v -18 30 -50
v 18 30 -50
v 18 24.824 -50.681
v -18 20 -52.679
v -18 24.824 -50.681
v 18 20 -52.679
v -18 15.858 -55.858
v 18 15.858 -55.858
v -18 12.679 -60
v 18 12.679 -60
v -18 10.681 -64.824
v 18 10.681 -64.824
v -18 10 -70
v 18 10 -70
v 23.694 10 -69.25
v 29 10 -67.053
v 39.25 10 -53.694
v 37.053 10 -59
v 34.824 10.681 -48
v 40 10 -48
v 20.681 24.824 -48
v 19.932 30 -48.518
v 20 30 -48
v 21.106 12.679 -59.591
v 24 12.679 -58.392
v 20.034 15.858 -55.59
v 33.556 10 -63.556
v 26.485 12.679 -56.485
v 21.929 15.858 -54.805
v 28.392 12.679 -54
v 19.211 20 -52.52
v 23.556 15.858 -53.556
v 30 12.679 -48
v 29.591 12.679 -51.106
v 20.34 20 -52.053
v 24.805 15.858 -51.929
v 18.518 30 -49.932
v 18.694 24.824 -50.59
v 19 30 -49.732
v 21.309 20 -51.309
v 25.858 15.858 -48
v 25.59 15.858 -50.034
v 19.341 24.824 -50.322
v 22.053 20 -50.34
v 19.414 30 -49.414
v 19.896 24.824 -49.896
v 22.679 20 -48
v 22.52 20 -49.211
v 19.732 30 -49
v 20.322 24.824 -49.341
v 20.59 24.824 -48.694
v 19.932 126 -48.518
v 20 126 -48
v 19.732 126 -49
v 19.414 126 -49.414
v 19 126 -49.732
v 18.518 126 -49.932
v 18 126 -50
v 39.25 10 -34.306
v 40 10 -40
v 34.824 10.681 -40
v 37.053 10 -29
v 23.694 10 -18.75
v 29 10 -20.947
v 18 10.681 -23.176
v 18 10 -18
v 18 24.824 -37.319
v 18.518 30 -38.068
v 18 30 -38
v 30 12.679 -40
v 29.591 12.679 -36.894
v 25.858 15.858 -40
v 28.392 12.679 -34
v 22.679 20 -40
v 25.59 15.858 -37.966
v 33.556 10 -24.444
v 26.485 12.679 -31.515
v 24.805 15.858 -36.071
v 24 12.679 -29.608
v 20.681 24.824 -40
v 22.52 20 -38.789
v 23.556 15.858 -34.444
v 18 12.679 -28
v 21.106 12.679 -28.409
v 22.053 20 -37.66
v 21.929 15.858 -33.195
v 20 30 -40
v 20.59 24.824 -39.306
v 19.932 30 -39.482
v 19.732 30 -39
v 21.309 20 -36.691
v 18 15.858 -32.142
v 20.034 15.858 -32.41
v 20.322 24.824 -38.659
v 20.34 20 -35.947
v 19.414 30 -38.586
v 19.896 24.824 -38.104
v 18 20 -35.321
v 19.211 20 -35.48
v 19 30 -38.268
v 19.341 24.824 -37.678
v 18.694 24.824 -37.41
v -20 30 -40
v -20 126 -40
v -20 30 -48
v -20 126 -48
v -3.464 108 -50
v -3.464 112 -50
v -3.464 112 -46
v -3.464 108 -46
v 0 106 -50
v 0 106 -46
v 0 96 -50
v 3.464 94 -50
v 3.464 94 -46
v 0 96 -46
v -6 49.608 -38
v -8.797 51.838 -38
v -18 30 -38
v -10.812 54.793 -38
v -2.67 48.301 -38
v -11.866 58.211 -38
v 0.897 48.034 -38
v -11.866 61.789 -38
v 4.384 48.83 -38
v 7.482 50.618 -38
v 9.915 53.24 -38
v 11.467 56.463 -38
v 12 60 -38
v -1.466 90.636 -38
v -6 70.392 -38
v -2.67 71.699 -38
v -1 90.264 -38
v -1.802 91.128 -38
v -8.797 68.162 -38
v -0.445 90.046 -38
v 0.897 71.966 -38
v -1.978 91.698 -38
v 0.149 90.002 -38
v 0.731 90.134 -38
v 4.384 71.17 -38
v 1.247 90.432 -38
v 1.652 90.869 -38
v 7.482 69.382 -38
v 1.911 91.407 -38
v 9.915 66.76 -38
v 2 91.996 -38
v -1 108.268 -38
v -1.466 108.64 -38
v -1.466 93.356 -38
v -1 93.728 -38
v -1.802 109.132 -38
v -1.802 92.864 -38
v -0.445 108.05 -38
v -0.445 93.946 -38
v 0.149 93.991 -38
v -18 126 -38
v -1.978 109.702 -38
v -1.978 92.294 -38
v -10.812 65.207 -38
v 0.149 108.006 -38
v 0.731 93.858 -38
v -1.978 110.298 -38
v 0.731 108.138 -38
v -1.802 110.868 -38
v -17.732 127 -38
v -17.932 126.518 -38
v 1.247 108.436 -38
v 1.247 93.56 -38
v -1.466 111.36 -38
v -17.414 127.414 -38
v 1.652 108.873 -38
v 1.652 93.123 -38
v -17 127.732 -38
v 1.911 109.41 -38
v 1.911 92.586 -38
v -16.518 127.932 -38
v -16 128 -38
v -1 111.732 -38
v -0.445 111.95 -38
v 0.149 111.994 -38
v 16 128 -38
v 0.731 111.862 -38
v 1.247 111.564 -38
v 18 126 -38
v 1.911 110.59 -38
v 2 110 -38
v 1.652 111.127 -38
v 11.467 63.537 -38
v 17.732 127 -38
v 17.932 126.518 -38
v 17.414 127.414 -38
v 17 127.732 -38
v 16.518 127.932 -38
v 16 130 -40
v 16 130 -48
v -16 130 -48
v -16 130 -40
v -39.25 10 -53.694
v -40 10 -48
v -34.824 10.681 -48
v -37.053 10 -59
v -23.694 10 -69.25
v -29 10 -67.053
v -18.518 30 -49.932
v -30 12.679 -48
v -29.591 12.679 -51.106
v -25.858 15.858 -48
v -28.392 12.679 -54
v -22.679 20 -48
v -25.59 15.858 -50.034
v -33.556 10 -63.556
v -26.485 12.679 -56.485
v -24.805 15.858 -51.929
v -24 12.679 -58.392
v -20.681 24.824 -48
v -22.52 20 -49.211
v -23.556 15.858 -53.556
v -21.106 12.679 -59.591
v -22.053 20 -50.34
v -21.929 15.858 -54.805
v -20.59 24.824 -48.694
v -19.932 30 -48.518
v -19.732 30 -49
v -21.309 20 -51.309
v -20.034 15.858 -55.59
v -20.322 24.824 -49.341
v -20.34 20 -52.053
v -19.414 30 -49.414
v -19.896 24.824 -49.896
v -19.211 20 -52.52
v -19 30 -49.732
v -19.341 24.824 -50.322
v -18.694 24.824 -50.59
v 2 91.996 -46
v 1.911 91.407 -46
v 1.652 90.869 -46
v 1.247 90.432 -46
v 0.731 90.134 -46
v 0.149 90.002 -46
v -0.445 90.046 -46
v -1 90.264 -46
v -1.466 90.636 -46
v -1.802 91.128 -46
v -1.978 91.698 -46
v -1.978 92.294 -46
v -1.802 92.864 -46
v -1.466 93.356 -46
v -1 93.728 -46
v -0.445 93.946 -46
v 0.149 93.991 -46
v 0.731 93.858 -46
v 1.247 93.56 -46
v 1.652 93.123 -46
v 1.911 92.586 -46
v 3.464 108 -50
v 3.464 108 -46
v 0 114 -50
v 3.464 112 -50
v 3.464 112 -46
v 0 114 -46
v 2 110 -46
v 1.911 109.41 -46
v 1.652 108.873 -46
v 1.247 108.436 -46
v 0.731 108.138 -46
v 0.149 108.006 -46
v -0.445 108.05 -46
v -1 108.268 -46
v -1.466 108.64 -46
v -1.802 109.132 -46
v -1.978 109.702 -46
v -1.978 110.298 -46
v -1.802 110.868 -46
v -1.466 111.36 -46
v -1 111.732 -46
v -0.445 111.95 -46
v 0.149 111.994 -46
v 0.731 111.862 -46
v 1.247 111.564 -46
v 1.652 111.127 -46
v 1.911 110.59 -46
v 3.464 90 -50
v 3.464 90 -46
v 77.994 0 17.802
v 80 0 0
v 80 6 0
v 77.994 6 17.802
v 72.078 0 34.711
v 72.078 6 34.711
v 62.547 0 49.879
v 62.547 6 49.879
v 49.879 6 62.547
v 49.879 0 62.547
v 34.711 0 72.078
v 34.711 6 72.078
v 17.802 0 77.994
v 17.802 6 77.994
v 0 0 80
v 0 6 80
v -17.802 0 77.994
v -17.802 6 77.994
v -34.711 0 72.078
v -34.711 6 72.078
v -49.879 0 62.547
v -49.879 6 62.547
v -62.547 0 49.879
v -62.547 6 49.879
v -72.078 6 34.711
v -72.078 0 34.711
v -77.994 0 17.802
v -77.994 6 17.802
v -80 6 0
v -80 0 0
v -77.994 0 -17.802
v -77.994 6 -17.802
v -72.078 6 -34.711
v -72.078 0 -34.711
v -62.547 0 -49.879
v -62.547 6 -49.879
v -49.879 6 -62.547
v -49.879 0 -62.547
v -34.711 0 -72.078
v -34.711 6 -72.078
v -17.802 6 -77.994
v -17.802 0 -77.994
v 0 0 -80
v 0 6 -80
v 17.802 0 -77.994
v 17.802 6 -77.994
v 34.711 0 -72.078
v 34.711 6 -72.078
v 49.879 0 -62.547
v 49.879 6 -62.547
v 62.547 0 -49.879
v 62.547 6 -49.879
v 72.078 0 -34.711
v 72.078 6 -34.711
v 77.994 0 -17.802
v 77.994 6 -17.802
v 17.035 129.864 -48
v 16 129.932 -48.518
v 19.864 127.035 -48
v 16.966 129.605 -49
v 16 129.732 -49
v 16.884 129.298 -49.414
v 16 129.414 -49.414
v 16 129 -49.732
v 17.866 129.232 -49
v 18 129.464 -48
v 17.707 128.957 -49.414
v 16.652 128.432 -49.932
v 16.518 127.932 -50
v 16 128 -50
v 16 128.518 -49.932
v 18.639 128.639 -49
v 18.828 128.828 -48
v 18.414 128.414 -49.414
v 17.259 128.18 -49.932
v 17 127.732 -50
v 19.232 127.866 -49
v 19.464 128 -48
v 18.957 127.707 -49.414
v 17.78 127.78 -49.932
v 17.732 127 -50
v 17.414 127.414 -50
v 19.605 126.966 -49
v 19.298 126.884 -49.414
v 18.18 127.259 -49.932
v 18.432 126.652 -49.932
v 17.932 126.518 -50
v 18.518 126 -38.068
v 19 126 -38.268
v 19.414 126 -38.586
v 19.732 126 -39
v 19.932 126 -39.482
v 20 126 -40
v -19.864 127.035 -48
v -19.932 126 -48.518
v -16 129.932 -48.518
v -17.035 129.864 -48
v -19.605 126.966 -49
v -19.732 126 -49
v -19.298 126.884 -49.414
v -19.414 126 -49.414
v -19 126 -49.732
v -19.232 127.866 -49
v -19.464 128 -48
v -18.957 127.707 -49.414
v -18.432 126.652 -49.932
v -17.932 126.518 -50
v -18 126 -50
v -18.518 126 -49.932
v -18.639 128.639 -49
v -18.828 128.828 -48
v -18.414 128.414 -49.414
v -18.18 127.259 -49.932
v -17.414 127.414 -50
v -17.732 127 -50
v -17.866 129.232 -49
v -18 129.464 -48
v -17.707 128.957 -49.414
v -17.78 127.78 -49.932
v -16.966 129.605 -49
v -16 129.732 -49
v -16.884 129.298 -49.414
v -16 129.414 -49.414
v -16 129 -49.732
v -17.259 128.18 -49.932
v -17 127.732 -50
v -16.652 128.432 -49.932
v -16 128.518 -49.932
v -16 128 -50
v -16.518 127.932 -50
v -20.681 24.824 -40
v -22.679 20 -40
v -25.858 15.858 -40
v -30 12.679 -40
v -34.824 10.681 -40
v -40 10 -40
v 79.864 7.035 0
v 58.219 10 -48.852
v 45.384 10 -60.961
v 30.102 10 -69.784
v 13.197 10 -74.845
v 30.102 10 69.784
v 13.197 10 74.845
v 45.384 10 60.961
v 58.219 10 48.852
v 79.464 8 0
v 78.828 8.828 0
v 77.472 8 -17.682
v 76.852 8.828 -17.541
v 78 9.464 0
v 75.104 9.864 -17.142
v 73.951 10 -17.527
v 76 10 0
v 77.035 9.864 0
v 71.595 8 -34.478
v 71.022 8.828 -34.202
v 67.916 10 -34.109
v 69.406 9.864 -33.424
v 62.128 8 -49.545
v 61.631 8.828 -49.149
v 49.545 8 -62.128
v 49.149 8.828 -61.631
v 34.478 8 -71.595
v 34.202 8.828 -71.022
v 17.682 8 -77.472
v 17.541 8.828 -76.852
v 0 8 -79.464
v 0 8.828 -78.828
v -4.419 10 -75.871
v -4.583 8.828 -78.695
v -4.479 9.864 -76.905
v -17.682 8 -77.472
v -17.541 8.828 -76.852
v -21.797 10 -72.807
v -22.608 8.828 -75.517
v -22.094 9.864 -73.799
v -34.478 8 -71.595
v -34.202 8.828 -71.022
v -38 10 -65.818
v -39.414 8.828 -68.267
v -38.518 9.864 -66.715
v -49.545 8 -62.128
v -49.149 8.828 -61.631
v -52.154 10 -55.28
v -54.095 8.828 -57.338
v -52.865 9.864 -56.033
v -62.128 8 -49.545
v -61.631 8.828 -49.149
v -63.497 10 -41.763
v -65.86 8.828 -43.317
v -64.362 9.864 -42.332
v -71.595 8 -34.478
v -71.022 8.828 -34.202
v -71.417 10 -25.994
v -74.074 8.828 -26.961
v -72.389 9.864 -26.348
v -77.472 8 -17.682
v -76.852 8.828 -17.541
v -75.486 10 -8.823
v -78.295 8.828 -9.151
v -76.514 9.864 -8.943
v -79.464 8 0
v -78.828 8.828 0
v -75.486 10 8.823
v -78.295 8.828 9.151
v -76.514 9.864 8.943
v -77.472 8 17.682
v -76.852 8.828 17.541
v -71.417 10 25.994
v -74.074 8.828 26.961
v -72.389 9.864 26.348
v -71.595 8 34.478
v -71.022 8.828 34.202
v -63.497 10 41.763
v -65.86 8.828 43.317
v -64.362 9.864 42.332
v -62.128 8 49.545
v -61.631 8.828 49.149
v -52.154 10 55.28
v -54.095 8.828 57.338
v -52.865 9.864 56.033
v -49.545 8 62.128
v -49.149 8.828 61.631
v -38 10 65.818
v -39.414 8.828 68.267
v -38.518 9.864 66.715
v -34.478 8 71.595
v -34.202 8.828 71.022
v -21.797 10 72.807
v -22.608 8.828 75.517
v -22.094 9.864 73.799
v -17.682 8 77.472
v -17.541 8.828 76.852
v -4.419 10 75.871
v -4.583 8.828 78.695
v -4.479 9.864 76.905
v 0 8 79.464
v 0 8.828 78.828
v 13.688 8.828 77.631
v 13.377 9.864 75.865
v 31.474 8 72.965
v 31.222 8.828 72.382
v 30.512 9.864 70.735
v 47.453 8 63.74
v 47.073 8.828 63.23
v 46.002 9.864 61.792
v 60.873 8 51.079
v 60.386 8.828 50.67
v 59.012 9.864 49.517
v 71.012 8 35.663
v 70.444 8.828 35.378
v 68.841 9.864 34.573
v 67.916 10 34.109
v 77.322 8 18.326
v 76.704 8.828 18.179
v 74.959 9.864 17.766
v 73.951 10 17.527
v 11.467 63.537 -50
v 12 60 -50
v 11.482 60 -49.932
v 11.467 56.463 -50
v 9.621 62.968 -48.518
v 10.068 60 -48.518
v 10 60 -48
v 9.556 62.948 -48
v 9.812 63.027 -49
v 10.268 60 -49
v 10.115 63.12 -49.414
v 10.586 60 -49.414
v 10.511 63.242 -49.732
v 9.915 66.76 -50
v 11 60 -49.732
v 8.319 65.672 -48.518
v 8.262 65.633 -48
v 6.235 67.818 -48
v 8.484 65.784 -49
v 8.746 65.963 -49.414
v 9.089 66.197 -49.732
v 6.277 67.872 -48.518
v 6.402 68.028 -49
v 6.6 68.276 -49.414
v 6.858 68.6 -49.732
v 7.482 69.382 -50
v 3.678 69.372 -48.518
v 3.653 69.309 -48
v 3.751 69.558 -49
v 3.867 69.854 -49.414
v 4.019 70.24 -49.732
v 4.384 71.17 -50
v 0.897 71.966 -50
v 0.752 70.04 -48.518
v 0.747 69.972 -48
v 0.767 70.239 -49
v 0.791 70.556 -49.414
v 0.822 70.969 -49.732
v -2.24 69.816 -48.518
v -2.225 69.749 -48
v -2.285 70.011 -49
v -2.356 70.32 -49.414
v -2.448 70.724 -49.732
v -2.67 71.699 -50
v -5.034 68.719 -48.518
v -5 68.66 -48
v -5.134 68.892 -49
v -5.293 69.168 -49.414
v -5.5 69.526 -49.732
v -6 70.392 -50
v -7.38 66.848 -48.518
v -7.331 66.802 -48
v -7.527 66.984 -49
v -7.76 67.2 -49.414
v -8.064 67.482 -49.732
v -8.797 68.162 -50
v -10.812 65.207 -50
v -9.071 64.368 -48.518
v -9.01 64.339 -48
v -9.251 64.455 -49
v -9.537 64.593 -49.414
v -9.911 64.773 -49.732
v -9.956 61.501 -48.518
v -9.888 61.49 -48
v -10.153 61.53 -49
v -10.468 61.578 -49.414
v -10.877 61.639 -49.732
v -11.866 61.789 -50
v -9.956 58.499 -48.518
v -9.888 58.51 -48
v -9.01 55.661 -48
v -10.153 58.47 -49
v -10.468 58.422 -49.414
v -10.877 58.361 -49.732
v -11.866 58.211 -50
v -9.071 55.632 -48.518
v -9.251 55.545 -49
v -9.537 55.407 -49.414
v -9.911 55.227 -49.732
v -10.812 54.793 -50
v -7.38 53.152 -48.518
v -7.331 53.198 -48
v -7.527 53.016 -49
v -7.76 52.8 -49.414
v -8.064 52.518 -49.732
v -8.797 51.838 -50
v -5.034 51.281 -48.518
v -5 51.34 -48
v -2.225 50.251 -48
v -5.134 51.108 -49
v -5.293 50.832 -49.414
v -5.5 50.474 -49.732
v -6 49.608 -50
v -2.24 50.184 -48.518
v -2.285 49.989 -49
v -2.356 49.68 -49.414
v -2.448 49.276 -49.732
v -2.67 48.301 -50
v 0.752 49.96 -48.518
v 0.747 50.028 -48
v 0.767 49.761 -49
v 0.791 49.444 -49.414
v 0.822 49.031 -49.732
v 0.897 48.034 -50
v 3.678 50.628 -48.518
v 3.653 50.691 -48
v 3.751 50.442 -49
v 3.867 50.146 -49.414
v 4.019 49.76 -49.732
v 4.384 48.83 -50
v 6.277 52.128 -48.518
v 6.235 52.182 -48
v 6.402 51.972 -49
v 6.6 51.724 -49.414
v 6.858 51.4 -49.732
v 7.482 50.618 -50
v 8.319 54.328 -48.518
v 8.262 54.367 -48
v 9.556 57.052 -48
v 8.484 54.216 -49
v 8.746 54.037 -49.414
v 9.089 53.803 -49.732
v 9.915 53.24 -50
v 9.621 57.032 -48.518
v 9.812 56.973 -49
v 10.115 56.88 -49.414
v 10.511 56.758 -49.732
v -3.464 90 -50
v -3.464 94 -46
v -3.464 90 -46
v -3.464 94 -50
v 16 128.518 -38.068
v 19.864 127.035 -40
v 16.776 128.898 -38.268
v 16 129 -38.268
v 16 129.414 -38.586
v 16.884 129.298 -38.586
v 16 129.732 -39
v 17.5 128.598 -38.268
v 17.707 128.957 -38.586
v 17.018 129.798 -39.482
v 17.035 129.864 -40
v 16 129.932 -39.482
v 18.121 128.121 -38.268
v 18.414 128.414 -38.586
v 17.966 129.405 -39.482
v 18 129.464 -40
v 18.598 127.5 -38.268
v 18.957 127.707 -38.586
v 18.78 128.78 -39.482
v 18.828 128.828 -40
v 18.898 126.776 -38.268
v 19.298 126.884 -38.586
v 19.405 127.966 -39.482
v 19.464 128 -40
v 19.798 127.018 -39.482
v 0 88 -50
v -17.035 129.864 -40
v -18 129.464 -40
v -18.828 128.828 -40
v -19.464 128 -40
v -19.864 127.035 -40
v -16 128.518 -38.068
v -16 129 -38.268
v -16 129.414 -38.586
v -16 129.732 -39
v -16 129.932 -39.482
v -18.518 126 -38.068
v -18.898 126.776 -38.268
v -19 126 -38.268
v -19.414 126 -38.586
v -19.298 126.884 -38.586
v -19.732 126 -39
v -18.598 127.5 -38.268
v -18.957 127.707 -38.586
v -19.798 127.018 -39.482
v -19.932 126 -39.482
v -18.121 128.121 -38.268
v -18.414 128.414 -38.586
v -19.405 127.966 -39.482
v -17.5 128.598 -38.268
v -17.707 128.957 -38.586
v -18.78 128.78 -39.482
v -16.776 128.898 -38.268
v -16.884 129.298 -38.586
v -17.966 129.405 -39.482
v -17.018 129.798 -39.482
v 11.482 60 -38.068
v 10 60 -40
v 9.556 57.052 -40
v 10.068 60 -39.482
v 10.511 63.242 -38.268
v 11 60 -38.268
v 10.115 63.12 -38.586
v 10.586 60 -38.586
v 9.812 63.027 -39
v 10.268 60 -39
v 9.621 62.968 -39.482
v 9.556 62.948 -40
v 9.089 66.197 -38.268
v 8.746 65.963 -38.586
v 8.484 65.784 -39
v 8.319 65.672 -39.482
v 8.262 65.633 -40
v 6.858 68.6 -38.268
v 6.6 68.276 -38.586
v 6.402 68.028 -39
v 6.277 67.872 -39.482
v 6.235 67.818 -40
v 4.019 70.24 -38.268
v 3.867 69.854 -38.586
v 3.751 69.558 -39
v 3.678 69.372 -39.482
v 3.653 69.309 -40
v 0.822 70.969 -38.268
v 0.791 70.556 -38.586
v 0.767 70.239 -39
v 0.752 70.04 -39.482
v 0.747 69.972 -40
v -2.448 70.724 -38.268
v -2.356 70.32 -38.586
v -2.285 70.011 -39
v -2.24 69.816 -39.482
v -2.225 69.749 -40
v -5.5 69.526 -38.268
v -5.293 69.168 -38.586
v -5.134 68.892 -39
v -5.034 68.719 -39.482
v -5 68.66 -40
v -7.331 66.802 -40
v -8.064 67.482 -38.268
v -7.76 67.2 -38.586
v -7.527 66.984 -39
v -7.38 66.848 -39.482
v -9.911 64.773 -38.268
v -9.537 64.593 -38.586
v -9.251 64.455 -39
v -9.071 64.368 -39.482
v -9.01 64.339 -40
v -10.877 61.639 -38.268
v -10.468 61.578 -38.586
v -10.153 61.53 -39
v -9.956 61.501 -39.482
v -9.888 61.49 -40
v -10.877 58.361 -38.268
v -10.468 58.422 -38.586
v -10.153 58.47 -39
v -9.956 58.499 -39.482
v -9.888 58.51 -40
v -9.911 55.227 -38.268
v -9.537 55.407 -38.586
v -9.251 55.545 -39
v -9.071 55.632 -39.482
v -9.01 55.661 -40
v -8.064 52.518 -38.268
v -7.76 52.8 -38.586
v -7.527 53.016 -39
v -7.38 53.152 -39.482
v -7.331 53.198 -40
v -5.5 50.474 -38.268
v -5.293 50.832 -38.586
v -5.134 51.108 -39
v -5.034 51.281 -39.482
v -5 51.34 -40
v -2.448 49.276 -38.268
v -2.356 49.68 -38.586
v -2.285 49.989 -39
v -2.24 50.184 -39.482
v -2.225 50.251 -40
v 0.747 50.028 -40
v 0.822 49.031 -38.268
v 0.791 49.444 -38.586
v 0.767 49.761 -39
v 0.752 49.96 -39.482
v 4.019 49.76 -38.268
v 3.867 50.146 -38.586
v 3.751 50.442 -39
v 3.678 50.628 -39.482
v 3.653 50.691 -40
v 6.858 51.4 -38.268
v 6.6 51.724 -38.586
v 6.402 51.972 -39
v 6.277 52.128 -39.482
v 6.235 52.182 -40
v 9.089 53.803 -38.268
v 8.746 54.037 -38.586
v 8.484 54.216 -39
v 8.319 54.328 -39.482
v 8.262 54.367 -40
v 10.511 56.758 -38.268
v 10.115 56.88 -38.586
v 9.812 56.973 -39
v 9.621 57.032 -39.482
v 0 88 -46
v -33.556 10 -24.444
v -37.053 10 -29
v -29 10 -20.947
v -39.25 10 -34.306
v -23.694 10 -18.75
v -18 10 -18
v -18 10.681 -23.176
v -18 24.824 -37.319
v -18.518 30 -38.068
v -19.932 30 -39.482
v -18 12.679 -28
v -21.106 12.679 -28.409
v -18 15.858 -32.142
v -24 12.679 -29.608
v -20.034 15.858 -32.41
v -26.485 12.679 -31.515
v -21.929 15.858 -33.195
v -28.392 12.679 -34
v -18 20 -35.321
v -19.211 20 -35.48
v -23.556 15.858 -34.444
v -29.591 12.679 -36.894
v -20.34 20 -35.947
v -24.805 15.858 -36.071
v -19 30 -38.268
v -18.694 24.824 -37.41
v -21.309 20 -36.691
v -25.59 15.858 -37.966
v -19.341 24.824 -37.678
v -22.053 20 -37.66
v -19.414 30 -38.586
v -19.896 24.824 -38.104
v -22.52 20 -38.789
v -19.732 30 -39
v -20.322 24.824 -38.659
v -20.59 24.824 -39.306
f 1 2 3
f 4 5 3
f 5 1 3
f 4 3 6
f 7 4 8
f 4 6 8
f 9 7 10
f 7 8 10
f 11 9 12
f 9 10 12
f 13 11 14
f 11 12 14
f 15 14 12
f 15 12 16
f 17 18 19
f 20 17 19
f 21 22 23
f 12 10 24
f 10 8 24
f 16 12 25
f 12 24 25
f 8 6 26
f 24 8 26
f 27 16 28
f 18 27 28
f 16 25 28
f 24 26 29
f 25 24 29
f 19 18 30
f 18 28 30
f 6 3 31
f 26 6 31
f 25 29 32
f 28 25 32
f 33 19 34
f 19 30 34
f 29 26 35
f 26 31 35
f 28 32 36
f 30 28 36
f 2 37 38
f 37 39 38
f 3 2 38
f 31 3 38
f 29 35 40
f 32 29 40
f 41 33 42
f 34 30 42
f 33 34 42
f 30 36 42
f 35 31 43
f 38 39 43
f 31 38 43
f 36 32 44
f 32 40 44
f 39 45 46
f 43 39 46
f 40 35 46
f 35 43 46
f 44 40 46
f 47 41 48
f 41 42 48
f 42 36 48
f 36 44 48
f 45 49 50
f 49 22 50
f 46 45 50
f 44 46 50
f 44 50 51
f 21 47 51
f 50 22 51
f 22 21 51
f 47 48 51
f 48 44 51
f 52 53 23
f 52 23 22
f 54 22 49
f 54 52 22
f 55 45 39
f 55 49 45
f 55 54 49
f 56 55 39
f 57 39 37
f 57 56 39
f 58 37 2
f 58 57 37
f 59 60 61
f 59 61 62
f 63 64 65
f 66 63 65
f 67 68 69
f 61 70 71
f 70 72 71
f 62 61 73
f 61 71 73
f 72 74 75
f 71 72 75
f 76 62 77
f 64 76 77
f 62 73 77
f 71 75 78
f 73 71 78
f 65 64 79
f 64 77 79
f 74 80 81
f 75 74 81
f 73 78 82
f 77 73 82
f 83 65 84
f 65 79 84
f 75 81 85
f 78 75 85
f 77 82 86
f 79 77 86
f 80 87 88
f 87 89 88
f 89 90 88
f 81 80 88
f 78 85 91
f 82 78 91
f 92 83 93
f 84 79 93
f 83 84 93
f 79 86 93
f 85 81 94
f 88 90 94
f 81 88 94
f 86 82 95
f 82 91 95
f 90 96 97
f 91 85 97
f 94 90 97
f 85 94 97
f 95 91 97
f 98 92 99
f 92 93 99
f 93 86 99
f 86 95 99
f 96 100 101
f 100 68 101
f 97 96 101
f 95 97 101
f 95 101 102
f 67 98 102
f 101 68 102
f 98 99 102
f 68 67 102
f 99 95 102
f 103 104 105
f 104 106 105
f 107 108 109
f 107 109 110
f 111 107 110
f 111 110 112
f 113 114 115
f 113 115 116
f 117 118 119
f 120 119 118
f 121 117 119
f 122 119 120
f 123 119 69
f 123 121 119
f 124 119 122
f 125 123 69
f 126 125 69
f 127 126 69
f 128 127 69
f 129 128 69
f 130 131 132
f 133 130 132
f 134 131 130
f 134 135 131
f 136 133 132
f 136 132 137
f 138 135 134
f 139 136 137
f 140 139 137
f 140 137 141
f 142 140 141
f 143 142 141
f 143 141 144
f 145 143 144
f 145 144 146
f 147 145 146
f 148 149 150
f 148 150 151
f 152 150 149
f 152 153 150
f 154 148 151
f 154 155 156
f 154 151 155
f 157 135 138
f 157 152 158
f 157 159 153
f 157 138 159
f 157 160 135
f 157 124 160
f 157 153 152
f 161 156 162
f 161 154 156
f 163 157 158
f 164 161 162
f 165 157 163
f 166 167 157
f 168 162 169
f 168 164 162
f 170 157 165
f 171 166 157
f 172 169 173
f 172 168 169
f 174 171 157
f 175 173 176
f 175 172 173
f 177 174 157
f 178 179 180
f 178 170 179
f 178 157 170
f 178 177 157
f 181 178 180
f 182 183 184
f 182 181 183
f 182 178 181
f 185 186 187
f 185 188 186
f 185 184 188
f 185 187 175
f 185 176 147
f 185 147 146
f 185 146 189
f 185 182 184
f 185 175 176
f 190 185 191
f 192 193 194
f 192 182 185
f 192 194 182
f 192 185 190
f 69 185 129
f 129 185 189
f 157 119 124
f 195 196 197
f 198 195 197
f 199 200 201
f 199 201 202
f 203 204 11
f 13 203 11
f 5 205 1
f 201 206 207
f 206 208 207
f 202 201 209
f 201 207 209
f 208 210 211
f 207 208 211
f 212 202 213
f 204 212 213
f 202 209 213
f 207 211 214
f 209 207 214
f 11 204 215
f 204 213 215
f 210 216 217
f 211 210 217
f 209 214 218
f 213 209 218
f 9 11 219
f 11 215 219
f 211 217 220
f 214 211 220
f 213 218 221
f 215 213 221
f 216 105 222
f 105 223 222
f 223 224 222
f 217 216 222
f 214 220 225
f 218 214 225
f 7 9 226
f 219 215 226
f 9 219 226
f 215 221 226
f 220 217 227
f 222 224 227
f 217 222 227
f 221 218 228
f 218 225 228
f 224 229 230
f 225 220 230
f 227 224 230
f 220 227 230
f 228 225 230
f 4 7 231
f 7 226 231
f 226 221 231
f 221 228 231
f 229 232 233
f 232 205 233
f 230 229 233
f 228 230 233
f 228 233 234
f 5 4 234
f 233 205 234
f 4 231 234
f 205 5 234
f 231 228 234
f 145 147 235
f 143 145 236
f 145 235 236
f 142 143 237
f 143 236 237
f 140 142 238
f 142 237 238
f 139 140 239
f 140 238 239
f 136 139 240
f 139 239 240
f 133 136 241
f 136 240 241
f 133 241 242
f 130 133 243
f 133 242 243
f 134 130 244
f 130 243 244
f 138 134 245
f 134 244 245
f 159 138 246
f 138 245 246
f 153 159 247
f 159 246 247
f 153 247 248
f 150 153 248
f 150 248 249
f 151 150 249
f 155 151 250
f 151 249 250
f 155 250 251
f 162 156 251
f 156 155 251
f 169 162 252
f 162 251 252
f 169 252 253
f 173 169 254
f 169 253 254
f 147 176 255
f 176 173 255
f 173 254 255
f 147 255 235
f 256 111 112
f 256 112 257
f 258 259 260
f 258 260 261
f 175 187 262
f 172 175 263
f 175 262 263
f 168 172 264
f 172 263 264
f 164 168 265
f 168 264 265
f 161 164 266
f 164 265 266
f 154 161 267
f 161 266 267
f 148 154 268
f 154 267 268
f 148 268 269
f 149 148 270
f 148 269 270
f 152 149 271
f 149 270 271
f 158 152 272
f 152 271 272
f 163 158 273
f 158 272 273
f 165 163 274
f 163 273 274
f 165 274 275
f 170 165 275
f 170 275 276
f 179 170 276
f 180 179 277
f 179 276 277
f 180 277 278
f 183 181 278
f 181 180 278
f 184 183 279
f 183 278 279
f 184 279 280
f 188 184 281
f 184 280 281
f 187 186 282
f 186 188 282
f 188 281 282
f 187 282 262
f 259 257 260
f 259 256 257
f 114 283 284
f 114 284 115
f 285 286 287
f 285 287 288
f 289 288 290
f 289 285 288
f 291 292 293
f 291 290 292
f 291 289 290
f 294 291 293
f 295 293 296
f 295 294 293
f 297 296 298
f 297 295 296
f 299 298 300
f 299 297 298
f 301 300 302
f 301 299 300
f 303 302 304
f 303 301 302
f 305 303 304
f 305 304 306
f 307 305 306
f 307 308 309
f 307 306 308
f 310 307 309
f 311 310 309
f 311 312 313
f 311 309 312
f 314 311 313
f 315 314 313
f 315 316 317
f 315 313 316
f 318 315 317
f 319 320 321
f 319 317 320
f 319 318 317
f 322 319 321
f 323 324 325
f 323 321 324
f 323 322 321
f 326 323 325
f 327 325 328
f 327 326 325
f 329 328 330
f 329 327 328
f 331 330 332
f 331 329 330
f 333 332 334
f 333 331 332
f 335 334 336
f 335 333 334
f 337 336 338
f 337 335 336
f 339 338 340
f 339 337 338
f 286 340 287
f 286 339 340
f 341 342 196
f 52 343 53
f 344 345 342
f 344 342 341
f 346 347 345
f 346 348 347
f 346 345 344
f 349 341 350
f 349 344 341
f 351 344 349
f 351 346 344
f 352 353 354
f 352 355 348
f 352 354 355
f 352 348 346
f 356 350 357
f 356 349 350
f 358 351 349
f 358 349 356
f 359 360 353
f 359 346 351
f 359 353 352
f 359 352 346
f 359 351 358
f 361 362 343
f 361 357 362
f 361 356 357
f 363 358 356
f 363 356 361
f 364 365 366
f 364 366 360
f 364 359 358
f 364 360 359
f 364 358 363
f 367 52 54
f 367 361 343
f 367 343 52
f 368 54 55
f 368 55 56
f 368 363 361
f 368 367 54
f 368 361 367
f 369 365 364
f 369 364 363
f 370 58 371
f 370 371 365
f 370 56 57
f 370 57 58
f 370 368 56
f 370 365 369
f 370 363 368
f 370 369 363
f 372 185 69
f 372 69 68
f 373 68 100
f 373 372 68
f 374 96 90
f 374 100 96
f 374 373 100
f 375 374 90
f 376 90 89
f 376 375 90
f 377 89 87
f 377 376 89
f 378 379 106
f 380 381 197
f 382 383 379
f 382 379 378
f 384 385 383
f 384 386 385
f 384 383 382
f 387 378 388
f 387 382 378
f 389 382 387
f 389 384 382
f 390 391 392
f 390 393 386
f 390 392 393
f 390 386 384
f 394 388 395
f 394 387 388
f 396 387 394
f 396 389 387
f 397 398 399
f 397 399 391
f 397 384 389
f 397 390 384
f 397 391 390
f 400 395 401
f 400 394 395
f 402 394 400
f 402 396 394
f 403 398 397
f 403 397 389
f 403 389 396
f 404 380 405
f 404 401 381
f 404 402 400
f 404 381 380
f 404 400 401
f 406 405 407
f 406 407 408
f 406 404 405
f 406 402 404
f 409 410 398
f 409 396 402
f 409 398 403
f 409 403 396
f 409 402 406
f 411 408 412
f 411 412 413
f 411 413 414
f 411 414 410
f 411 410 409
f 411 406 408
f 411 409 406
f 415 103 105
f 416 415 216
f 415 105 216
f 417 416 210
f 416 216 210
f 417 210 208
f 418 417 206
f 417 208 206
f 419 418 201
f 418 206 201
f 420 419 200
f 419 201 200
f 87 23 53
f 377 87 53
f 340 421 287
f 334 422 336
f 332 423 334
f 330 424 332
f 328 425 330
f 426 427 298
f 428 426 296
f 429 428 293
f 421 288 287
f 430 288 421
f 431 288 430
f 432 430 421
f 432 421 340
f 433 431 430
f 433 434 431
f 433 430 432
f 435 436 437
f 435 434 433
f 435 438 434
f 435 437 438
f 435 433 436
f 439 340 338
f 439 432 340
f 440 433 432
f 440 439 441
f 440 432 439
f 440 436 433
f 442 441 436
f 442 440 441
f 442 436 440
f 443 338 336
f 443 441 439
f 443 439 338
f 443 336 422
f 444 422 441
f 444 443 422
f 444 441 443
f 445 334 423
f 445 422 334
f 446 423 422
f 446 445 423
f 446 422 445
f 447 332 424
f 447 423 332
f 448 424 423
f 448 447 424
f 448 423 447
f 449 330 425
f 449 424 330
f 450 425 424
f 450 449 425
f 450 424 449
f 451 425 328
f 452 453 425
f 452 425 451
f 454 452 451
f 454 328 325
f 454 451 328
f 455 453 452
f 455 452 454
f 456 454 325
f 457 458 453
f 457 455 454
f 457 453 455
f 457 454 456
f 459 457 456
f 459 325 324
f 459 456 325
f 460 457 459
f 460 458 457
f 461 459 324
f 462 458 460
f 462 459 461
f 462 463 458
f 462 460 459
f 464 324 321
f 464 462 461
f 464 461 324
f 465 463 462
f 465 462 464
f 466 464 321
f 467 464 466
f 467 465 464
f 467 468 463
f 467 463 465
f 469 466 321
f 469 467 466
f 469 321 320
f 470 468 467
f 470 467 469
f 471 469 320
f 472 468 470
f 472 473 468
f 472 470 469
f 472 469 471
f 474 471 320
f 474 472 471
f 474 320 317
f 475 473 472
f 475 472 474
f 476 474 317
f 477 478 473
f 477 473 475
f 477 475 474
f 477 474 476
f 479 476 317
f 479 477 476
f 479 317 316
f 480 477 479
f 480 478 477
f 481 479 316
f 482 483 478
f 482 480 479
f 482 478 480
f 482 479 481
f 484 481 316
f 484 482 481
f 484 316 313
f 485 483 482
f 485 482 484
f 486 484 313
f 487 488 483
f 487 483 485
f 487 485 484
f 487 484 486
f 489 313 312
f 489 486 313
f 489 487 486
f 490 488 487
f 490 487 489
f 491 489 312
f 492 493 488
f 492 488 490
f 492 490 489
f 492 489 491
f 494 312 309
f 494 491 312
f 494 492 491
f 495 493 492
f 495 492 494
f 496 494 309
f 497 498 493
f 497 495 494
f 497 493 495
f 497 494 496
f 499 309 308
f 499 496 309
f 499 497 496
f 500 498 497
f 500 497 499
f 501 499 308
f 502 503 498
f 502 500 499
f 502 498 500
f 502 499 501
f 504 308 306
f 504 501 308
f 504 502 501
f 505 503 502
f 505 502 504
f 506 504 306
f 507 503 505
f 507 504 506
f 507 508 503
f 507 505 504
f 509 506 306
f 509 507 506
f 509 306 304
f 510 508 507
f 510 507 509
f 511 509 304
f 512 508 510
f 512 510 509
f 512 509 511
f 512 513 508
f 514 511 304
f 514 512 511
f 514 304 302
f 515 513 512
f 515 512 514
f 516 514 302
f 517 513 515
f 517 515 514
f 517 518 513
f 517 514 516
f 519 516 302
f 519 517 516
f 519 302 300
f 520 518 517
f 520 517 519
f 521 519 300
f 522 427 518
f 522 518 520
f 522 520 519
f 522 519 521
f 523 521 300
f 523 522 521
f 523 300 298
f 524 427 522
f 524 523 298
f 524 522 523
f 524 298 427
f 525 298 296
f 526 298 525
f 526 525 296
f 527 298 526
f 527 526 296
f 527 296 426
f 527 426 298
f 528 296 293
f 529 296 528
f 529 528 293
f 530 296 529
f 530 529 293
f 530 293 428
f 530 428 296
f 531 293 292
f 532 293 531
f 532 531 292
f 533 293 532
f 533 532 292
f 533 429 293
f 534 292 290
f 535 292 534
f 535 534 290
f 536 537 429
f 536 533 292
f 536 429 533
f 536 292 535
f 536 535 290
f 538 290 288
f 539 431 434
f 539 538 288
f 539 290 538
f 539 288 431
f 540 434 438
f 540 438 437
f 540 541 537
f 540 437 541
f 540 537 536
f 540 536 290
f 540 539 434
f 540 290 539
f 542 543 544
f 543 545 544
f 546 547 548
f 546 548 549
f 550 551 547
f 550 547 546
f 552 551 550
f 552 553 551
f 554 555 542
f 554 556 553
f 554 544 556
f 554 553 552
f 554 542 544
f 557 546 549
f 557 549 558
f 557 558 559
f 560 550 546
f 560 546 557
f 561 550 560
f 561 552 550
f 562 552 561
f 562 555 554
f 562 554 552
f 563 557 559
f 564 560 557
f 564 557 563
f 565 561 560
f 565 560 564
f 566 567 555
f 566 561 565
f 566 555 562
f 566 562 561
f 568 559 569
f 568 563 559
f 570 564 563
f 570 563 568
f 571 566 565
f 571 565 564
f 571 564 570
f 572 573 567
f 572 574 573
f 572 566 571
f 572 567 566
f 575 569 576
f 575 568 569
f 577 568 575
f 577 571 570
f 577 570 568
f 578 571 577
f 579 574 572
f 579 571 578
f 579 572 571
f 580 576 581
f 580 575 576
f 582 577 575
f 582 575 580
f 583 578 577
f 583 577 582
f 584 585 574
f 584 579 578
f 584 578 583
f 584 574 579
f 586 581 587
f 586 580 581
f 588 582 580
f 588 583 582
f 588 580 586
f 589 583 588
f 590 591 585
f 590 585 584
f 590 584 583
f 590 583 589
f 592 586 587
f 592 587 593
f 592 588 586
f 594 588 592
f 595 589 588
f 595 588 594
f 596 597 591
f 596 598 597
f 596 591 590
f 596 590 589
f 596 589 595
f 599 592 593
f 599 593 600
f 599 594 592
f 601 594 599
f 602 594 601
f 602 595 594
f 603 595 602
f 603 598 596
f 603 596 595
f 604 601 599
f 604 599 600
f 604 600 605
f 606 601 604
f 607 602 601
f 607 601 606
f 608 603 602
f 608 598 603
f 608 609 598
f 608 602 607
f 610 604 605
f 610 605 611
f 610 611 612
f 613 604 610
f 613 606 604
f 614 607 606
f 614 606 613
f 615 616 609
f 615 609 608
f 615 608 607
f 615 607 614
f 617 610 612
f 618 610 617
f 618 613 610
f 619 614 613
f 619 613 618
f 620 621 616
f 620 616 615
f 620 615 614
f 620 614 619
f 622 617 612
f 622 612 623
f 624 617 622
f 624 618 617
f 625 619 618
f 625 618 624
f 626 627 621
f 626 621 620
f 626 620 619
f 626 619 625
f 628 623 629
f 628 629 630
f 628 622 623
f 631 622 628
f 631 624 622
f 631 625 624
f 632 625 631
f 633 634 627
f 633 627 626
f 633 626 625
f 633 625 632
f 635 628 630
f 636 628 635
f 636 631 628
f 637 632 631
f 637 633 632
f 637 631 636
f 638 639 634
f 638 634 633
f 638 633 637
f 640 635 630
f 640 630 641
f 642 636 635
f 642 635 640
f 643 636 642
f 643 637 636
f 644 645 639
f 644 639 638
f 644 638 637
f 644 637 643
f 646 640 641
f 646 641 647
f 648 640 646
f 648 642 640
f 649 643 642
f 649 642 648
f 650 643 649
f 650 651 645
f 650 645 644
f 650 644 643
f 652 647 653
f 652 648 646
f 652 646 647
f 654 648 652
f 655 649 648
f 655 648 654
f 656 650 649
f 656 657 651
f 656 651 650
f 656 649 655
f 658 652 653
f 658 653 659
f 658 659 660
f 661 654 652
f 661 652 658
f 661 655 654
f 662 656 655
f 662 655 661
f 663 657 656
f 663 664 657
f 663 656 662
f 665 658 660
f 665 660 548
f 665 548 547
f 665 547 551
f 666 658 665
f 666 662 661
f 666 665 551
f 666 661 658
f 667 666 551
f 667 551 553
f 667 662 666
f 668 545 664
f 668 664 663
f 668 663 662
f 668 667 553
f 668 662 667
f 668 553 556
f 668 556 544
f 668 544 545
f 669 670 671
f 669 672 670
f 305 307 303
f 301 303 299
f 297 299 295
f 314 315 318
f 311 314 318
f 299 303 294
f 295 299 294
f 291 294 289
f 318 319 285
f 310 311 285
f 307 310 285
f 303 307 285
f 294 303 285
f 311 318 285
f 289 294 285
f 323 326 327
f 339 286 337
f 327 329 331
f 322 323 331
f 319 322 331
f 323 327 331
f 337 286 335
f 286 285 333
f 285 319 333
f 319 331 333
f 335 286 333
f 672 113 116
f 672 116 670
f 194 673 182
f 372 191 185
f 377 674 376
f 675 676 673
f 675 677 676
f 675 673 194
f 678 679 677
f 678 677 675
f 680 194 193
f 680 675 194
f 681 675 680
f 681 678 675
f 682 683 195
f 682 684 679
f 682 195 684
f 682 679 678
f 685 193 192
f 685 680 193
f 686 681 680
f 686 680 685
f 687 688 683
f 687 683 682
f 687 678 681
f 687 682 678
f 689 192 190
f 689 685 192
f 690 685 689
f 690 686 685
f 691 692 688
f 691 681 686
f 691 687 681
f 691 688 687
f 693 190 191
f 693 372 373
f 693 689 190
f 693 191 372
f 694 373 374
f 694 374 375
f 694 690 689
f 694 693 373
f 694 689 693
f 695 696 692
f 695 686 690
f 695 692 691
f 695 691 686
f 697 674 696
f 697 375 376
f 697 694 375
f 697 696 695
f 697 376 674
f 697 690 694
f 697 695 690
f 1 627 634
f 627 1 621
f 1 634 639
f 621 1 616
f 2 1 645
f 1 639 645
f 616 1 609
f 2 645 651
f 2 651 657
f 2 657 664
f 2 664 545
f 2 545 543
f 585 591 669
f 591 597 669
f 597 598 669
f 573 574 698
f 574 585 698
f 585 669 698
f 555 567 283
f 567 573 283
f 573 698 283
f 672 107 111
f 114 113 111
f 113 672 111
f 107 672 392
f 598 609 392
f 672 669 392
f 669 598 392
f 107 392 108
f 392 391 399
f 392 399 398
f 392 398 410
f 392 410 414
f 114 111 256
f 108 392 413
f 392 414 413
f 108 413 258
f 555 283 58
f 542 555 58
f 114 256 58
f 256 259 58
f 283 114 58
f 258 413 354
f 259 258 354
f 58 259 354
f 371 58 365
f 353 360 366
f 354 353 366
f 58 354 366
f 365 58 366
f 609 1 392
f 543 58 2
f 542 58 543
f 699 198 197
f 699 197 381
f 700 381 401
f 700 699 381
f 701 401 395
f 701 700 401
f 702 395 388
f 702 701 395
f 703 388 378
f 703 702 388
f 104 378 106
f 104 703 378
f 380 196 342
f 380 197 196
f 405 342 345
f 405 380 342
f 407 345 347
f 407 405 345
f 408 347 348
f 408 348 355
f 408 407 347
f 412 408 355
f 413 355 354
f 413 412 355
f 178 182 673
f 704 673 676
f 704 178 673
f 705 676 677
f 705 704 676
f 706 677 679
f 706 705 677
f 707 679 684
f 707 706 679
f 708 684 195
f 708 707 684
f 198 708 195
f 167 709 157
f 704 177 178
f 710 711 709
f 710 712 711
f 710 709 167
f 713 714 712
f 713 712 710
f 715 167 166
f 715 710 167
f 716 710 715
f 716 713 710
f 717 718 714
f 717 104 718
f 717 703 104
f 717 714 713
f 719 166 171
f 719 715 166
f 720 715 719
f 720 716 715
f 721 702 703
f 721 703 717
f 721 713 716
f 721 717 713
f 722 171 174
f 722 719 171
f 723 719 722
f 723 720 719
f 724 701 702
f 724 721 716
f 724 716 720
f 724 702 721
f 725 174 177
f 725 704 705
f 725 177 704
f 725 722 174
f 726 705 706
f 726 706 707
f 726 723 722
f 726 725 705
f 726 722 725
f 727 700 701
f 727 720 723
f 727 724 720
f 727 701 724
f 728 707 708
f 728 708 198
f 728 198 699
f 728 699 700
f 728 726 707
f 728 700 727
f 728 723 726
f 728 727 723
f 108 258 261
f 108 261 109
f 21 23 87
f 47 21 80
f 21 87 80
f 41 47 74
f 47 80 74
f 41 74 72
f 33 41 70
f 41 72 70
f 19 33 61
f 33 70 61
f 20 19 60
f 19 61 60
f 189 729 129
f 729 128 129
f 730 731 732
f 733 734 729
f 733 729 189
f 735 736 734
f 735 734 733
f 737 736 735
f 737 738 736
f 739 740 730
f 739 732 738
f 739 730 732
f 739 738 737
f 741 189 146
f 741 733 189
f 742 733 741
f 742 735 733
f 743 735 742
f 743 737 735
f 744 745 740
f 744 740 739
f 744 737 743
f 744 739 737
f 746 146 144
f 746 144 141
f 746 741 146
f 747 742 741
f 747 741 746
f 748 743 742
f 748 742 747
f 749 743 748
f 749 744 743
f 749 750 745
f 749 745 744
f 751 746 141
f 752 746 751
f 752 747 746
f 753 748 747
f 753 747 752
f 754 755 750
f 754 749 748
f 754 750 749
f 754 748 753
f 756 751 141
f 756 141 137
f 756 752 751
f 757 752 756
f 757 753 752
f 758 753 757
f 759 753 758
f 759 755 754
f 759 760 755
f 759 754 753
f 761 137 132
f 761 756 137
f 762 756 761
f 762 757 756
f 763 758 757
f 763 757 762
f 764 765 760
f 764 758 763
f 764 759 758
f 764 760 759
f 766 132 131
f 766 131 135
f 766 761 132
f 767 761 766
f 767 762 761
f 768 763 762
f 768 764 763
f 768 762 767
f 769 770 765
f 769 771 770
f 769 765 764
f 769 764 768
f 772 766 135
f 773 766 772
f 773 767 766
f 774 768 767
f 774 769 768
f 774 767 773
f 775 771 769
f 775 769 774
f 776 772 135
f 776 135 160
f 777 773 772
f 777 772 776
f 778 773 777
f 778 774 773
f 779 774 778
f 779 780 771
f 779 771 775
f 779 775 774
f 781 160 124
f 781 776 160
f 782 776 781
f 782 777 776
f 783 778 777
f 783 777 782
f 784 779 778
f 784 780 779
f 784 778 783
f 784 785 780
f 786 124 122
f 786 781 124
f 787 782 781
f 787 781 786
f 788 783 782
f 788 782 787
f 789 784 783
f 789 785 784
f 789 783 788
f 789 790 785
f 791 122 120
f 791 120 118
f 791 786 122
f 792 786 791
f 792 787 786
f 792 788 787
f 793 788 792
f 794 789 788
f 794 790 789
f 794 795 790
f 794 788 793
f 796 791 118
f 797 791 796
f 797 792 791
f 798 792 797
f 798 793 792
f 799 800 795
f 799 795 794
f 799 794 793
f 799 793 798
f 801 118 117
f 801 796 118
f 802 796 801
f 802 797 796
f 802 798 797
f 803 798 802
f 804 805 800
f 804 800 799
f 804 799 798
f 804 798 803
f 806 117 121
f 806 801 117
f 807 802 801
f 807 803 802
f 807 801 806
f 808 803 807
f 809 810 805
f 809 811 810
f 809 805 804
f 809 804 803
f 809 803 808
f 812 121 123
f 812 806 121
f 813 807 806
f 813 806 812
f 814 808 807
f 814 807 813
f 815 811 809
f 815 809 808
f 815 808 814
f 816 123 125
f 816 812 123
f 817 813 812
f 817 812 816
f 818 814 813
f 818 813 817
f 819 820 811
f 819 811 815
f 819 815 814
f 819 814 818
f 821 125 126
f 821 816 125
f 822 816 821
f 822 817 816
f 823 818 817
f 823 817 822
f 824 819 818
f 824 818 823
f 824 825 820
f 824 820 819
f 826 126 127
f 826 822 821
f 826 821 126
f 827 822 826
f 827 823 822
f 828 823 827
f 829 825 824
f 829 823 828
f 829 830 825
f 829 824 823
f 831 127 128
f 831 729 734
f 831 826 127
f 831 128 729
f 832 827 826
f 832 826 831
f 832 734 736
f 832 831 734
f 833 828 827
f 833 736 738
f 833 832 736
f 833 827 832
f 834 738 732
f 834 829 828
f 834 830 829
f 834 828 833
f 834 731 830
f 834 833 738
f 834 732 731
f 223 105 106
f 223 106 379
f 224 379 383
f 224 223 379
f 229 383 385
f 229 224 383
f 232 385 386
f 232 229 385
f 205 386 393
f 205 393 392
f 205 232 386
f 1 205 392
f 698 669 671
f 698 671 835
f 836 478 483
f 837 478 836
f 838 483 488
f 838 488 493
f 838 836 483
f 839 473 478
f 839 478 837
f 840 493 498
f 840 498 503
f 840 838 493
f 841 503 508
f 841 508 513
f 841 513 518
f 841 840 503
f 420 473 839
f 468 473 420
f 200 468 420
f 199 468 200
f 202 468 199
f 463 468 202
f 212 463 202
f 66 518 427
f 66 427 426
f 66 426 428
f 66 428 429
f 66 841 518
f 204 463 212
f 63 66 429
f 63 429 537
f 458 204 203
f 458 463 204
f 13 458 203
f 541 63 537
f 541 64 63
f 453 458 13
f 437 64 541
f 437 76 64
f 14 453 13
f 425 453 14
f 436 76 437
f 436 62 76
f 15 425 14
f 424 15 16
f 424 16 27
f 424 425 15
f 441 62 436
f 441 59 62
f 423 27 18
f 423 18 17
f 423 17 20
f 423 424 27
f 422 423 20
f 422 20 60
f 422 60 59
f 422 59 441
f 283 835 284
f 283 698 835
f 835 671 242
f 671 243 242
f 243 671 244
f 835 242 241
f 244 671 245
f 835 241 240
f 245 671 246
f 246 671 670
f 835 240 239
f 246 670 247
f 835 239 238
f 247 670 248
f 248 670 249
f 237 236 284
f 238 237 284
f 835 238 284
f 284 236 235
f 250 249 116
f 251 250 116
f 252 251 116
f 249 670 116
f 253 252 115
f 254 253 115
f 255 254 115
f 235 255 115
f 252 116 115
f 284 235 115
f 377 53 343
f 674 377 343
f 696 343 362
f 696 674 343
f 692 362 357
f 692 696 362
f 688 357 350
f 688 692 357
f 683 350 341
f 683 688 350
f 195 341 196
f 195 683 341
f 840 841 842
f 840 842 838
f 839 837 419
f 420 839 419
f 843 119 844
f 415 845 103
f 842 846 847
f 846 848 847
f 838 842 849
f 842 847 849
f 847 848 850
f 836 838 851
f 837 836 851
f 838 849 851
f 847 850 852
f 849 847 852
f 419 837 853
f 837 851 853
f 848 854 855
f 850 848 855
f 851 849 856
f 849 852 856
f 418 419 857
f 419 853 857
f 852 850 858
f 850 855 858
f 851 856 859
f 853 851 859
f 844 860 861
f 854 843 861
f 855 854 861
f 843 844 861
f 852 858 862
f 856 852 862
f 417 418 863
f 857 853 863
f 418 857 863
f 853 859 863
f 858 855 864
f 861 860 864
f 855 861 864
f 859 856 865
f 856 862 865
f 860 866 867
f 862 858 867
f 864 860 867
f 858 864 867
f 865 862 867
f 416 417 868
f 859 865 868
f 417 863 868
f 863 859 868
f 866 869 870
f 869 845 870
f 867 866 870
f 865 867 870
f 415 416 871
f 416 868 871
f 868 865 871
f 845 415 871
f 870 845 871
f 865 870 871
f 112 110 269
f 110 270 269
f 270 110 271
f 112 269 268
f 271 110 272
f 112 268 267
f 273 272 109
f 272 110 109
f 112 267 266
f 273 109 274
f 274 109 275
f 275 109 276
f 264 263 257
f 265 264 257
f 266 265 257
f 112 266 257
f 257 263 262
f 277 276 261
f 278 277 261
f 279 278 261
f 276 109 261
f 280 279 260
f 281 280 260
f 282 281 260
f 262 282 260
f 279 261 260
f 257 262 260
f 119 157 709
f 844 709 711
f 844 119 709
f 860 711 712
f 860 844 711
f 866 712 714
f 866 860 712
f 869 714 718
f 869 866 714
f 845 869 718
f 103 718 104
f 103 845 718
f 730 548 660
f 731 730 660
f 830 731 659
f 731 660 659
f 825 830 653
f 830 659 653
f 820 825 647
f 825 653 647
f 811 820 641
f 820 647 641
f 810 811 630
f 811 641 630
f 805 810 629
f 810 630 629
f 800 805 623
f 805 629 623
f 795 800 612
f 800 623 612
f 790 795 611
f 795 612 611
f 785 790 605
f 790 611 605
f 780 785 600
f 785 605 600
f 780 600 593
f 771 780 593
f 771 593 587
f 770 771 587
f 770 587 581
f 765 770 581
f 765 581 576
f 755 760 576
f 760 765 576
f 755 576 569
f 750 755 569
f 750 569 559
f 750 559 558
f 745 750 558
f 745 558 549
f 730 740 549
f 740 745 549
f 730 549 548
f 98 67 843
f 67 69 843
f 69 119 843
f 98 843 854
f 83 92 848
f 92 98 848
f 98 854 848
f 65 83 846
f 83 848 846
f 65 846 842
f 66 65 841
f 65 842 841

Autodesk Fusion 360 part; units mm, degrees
sketch "Sketch1" plane through (0, 0, 0) normal (0, 1, 0) x (1, 0, 0)
  circle A0 centre (0, 0) radius 80
  dimension "d1" = 160
extrude "Extrude1" add sketch "Sketch1" along normal blind 10 makes body 1
fillet "Fillet1" radius 4 1 edges at (-74.5862, 10, 28.9292) on bodies 1
sketch "Sketch2" plane through (0, 0, 0) normal (0, 1, 0) x (1, 0, 0)
  line L0 (125, 0) -> (165, 0)
  line L1 (165, 0) -> (165, 120)
  line L2 (165, 120) -> (125, 120)
  line L3 (125, 120) -> (125, 0)
  circle A0 centre (145, 100) radius 2
  circle A1 centre (145, 81.9961) radius 2
  circle A2 centre (145, 50) radius 10
  point P0 (145, 100)
  dimension "d5" = 120
  dimension "d6" = 40
  dimension "d7" = 4
  dimension "d8" = 4
  dimension "d9" = 20
extrude "Extrude2" add sketch "Sketch2" along normal blind 12 separate body makes body 2
sketch "Sketch3" plane through (0, 0, 0) normal (0, 1, 0) x (1, 0, 0)
  line L0 (145, 104) -> (141.5359, 102)
  line L1 (141.5359, 102) -> (141.5359, 98)
  line L2 (141.5359, 98) -> (145, 96)
  line L3 (145, 96) -> (148.4641, 98)
  line L4 (148.4641, 98) -> (148.4641, 102)
  line L5 (148.4641, 102) -> (145, 104)
  line L6 (145, 86) -> (141.5359, 84)
  line L7 (141.5359, 84) -> (141.5359, 80)
  line L8 (141.5359, 80) -> (145, 78)
  line L9 (145, 78) -> (148.4641, 80)
  line L10 (148.4641, 80) -> (148.4641, 84)
  line L11 (148.4641, 84) -> (145, 86)
  point P0 (145, 100)
  point P1 (145, 82)
extrude "Extrude3" cut sketch "Sketch3" along normal blind 4 contours L6 L7 L8 L9 L10 L11 bodies 2
sketch "Sketch4" plane through (0, 0, 0) normal (0, 1, 0) x (1, 0, 0)
  line L0 (145, 104) -> (141.5359, 102)
  line L1 (141.5359, 102) -> (141.5359, 98)
  line L2 (141.5359, 98) -> (145, 96)
  line L3 (145, 96) -> (148.4641, 98)
  line L4 (148.4641, 98) -> (148.4641, 102)
  line L5 (148.4641, 102) -> (145, 104)
  point P0 (145, 100)
extrude "Extrude4" cut sketch "Sketch4" along normal blind 4 bodies 2
fillet "Fillet2" radius 4 1 edges at (165, 6, -120) on bodies 2
fillet "Fillet3" radius 4 1 edges at (125, 6, -120) on bodies 2
fillet "Fillet4" radius 2 1 edges at (135.6767, 12, -53.6162) on bodies 2
fillet "Fillet5" radius 2 1 edges at (135.6767, 0, -53.6162) on bodies 2
move_body "Move1" bodies 2 to x (1, 0, 0) y (0, 0, 1) z (0, -1, 0) at (0, 0, 0)
move_body "Move2" bodies 2 to x (1, 0, 0) y (0, 1, 0) z (0, 0, 1) at (0, 10, 0)
move_body "Move3" bodies 2 to x (1, 0, 0) y (0, 1, 0) z (0, 0, 1) at (-145, 0, 0)
move_body "Move4" bodies 2 to x (1, 0, 0) y (0, 1, 0) z (0, 0, 1) at (0, 0, -50)
combine "Combine1" operation add target body 1 tool bodies 2
fillet "Fillet6" radius 2 5 edges at (20, 68, -50) (18.8284, 128.8284, -50) (0, 130, -50) (-18.8284, 128.8284, -50) (-20, 68, -50) on bodies 1
fillet "Fillet7" radius 2 5 edges at (20, 68, -38) (18.8284, 128.8284, -38) (0, 130, -38) (-18.8284, 128.8284, -38) (-20, 68, -38) on bodies 1
fillet "Fillet8" radius 20 8 edges at (-19.4142, 10, -38.5858) (-20, 10, -44) (-19.4142, 10, -49.4142) (0, 10, -50) (19.4142, 10, -49.4142) (20, 10, -44) (19.4142, 10, -38.5858) (0, 10, -38) on bodies 1
